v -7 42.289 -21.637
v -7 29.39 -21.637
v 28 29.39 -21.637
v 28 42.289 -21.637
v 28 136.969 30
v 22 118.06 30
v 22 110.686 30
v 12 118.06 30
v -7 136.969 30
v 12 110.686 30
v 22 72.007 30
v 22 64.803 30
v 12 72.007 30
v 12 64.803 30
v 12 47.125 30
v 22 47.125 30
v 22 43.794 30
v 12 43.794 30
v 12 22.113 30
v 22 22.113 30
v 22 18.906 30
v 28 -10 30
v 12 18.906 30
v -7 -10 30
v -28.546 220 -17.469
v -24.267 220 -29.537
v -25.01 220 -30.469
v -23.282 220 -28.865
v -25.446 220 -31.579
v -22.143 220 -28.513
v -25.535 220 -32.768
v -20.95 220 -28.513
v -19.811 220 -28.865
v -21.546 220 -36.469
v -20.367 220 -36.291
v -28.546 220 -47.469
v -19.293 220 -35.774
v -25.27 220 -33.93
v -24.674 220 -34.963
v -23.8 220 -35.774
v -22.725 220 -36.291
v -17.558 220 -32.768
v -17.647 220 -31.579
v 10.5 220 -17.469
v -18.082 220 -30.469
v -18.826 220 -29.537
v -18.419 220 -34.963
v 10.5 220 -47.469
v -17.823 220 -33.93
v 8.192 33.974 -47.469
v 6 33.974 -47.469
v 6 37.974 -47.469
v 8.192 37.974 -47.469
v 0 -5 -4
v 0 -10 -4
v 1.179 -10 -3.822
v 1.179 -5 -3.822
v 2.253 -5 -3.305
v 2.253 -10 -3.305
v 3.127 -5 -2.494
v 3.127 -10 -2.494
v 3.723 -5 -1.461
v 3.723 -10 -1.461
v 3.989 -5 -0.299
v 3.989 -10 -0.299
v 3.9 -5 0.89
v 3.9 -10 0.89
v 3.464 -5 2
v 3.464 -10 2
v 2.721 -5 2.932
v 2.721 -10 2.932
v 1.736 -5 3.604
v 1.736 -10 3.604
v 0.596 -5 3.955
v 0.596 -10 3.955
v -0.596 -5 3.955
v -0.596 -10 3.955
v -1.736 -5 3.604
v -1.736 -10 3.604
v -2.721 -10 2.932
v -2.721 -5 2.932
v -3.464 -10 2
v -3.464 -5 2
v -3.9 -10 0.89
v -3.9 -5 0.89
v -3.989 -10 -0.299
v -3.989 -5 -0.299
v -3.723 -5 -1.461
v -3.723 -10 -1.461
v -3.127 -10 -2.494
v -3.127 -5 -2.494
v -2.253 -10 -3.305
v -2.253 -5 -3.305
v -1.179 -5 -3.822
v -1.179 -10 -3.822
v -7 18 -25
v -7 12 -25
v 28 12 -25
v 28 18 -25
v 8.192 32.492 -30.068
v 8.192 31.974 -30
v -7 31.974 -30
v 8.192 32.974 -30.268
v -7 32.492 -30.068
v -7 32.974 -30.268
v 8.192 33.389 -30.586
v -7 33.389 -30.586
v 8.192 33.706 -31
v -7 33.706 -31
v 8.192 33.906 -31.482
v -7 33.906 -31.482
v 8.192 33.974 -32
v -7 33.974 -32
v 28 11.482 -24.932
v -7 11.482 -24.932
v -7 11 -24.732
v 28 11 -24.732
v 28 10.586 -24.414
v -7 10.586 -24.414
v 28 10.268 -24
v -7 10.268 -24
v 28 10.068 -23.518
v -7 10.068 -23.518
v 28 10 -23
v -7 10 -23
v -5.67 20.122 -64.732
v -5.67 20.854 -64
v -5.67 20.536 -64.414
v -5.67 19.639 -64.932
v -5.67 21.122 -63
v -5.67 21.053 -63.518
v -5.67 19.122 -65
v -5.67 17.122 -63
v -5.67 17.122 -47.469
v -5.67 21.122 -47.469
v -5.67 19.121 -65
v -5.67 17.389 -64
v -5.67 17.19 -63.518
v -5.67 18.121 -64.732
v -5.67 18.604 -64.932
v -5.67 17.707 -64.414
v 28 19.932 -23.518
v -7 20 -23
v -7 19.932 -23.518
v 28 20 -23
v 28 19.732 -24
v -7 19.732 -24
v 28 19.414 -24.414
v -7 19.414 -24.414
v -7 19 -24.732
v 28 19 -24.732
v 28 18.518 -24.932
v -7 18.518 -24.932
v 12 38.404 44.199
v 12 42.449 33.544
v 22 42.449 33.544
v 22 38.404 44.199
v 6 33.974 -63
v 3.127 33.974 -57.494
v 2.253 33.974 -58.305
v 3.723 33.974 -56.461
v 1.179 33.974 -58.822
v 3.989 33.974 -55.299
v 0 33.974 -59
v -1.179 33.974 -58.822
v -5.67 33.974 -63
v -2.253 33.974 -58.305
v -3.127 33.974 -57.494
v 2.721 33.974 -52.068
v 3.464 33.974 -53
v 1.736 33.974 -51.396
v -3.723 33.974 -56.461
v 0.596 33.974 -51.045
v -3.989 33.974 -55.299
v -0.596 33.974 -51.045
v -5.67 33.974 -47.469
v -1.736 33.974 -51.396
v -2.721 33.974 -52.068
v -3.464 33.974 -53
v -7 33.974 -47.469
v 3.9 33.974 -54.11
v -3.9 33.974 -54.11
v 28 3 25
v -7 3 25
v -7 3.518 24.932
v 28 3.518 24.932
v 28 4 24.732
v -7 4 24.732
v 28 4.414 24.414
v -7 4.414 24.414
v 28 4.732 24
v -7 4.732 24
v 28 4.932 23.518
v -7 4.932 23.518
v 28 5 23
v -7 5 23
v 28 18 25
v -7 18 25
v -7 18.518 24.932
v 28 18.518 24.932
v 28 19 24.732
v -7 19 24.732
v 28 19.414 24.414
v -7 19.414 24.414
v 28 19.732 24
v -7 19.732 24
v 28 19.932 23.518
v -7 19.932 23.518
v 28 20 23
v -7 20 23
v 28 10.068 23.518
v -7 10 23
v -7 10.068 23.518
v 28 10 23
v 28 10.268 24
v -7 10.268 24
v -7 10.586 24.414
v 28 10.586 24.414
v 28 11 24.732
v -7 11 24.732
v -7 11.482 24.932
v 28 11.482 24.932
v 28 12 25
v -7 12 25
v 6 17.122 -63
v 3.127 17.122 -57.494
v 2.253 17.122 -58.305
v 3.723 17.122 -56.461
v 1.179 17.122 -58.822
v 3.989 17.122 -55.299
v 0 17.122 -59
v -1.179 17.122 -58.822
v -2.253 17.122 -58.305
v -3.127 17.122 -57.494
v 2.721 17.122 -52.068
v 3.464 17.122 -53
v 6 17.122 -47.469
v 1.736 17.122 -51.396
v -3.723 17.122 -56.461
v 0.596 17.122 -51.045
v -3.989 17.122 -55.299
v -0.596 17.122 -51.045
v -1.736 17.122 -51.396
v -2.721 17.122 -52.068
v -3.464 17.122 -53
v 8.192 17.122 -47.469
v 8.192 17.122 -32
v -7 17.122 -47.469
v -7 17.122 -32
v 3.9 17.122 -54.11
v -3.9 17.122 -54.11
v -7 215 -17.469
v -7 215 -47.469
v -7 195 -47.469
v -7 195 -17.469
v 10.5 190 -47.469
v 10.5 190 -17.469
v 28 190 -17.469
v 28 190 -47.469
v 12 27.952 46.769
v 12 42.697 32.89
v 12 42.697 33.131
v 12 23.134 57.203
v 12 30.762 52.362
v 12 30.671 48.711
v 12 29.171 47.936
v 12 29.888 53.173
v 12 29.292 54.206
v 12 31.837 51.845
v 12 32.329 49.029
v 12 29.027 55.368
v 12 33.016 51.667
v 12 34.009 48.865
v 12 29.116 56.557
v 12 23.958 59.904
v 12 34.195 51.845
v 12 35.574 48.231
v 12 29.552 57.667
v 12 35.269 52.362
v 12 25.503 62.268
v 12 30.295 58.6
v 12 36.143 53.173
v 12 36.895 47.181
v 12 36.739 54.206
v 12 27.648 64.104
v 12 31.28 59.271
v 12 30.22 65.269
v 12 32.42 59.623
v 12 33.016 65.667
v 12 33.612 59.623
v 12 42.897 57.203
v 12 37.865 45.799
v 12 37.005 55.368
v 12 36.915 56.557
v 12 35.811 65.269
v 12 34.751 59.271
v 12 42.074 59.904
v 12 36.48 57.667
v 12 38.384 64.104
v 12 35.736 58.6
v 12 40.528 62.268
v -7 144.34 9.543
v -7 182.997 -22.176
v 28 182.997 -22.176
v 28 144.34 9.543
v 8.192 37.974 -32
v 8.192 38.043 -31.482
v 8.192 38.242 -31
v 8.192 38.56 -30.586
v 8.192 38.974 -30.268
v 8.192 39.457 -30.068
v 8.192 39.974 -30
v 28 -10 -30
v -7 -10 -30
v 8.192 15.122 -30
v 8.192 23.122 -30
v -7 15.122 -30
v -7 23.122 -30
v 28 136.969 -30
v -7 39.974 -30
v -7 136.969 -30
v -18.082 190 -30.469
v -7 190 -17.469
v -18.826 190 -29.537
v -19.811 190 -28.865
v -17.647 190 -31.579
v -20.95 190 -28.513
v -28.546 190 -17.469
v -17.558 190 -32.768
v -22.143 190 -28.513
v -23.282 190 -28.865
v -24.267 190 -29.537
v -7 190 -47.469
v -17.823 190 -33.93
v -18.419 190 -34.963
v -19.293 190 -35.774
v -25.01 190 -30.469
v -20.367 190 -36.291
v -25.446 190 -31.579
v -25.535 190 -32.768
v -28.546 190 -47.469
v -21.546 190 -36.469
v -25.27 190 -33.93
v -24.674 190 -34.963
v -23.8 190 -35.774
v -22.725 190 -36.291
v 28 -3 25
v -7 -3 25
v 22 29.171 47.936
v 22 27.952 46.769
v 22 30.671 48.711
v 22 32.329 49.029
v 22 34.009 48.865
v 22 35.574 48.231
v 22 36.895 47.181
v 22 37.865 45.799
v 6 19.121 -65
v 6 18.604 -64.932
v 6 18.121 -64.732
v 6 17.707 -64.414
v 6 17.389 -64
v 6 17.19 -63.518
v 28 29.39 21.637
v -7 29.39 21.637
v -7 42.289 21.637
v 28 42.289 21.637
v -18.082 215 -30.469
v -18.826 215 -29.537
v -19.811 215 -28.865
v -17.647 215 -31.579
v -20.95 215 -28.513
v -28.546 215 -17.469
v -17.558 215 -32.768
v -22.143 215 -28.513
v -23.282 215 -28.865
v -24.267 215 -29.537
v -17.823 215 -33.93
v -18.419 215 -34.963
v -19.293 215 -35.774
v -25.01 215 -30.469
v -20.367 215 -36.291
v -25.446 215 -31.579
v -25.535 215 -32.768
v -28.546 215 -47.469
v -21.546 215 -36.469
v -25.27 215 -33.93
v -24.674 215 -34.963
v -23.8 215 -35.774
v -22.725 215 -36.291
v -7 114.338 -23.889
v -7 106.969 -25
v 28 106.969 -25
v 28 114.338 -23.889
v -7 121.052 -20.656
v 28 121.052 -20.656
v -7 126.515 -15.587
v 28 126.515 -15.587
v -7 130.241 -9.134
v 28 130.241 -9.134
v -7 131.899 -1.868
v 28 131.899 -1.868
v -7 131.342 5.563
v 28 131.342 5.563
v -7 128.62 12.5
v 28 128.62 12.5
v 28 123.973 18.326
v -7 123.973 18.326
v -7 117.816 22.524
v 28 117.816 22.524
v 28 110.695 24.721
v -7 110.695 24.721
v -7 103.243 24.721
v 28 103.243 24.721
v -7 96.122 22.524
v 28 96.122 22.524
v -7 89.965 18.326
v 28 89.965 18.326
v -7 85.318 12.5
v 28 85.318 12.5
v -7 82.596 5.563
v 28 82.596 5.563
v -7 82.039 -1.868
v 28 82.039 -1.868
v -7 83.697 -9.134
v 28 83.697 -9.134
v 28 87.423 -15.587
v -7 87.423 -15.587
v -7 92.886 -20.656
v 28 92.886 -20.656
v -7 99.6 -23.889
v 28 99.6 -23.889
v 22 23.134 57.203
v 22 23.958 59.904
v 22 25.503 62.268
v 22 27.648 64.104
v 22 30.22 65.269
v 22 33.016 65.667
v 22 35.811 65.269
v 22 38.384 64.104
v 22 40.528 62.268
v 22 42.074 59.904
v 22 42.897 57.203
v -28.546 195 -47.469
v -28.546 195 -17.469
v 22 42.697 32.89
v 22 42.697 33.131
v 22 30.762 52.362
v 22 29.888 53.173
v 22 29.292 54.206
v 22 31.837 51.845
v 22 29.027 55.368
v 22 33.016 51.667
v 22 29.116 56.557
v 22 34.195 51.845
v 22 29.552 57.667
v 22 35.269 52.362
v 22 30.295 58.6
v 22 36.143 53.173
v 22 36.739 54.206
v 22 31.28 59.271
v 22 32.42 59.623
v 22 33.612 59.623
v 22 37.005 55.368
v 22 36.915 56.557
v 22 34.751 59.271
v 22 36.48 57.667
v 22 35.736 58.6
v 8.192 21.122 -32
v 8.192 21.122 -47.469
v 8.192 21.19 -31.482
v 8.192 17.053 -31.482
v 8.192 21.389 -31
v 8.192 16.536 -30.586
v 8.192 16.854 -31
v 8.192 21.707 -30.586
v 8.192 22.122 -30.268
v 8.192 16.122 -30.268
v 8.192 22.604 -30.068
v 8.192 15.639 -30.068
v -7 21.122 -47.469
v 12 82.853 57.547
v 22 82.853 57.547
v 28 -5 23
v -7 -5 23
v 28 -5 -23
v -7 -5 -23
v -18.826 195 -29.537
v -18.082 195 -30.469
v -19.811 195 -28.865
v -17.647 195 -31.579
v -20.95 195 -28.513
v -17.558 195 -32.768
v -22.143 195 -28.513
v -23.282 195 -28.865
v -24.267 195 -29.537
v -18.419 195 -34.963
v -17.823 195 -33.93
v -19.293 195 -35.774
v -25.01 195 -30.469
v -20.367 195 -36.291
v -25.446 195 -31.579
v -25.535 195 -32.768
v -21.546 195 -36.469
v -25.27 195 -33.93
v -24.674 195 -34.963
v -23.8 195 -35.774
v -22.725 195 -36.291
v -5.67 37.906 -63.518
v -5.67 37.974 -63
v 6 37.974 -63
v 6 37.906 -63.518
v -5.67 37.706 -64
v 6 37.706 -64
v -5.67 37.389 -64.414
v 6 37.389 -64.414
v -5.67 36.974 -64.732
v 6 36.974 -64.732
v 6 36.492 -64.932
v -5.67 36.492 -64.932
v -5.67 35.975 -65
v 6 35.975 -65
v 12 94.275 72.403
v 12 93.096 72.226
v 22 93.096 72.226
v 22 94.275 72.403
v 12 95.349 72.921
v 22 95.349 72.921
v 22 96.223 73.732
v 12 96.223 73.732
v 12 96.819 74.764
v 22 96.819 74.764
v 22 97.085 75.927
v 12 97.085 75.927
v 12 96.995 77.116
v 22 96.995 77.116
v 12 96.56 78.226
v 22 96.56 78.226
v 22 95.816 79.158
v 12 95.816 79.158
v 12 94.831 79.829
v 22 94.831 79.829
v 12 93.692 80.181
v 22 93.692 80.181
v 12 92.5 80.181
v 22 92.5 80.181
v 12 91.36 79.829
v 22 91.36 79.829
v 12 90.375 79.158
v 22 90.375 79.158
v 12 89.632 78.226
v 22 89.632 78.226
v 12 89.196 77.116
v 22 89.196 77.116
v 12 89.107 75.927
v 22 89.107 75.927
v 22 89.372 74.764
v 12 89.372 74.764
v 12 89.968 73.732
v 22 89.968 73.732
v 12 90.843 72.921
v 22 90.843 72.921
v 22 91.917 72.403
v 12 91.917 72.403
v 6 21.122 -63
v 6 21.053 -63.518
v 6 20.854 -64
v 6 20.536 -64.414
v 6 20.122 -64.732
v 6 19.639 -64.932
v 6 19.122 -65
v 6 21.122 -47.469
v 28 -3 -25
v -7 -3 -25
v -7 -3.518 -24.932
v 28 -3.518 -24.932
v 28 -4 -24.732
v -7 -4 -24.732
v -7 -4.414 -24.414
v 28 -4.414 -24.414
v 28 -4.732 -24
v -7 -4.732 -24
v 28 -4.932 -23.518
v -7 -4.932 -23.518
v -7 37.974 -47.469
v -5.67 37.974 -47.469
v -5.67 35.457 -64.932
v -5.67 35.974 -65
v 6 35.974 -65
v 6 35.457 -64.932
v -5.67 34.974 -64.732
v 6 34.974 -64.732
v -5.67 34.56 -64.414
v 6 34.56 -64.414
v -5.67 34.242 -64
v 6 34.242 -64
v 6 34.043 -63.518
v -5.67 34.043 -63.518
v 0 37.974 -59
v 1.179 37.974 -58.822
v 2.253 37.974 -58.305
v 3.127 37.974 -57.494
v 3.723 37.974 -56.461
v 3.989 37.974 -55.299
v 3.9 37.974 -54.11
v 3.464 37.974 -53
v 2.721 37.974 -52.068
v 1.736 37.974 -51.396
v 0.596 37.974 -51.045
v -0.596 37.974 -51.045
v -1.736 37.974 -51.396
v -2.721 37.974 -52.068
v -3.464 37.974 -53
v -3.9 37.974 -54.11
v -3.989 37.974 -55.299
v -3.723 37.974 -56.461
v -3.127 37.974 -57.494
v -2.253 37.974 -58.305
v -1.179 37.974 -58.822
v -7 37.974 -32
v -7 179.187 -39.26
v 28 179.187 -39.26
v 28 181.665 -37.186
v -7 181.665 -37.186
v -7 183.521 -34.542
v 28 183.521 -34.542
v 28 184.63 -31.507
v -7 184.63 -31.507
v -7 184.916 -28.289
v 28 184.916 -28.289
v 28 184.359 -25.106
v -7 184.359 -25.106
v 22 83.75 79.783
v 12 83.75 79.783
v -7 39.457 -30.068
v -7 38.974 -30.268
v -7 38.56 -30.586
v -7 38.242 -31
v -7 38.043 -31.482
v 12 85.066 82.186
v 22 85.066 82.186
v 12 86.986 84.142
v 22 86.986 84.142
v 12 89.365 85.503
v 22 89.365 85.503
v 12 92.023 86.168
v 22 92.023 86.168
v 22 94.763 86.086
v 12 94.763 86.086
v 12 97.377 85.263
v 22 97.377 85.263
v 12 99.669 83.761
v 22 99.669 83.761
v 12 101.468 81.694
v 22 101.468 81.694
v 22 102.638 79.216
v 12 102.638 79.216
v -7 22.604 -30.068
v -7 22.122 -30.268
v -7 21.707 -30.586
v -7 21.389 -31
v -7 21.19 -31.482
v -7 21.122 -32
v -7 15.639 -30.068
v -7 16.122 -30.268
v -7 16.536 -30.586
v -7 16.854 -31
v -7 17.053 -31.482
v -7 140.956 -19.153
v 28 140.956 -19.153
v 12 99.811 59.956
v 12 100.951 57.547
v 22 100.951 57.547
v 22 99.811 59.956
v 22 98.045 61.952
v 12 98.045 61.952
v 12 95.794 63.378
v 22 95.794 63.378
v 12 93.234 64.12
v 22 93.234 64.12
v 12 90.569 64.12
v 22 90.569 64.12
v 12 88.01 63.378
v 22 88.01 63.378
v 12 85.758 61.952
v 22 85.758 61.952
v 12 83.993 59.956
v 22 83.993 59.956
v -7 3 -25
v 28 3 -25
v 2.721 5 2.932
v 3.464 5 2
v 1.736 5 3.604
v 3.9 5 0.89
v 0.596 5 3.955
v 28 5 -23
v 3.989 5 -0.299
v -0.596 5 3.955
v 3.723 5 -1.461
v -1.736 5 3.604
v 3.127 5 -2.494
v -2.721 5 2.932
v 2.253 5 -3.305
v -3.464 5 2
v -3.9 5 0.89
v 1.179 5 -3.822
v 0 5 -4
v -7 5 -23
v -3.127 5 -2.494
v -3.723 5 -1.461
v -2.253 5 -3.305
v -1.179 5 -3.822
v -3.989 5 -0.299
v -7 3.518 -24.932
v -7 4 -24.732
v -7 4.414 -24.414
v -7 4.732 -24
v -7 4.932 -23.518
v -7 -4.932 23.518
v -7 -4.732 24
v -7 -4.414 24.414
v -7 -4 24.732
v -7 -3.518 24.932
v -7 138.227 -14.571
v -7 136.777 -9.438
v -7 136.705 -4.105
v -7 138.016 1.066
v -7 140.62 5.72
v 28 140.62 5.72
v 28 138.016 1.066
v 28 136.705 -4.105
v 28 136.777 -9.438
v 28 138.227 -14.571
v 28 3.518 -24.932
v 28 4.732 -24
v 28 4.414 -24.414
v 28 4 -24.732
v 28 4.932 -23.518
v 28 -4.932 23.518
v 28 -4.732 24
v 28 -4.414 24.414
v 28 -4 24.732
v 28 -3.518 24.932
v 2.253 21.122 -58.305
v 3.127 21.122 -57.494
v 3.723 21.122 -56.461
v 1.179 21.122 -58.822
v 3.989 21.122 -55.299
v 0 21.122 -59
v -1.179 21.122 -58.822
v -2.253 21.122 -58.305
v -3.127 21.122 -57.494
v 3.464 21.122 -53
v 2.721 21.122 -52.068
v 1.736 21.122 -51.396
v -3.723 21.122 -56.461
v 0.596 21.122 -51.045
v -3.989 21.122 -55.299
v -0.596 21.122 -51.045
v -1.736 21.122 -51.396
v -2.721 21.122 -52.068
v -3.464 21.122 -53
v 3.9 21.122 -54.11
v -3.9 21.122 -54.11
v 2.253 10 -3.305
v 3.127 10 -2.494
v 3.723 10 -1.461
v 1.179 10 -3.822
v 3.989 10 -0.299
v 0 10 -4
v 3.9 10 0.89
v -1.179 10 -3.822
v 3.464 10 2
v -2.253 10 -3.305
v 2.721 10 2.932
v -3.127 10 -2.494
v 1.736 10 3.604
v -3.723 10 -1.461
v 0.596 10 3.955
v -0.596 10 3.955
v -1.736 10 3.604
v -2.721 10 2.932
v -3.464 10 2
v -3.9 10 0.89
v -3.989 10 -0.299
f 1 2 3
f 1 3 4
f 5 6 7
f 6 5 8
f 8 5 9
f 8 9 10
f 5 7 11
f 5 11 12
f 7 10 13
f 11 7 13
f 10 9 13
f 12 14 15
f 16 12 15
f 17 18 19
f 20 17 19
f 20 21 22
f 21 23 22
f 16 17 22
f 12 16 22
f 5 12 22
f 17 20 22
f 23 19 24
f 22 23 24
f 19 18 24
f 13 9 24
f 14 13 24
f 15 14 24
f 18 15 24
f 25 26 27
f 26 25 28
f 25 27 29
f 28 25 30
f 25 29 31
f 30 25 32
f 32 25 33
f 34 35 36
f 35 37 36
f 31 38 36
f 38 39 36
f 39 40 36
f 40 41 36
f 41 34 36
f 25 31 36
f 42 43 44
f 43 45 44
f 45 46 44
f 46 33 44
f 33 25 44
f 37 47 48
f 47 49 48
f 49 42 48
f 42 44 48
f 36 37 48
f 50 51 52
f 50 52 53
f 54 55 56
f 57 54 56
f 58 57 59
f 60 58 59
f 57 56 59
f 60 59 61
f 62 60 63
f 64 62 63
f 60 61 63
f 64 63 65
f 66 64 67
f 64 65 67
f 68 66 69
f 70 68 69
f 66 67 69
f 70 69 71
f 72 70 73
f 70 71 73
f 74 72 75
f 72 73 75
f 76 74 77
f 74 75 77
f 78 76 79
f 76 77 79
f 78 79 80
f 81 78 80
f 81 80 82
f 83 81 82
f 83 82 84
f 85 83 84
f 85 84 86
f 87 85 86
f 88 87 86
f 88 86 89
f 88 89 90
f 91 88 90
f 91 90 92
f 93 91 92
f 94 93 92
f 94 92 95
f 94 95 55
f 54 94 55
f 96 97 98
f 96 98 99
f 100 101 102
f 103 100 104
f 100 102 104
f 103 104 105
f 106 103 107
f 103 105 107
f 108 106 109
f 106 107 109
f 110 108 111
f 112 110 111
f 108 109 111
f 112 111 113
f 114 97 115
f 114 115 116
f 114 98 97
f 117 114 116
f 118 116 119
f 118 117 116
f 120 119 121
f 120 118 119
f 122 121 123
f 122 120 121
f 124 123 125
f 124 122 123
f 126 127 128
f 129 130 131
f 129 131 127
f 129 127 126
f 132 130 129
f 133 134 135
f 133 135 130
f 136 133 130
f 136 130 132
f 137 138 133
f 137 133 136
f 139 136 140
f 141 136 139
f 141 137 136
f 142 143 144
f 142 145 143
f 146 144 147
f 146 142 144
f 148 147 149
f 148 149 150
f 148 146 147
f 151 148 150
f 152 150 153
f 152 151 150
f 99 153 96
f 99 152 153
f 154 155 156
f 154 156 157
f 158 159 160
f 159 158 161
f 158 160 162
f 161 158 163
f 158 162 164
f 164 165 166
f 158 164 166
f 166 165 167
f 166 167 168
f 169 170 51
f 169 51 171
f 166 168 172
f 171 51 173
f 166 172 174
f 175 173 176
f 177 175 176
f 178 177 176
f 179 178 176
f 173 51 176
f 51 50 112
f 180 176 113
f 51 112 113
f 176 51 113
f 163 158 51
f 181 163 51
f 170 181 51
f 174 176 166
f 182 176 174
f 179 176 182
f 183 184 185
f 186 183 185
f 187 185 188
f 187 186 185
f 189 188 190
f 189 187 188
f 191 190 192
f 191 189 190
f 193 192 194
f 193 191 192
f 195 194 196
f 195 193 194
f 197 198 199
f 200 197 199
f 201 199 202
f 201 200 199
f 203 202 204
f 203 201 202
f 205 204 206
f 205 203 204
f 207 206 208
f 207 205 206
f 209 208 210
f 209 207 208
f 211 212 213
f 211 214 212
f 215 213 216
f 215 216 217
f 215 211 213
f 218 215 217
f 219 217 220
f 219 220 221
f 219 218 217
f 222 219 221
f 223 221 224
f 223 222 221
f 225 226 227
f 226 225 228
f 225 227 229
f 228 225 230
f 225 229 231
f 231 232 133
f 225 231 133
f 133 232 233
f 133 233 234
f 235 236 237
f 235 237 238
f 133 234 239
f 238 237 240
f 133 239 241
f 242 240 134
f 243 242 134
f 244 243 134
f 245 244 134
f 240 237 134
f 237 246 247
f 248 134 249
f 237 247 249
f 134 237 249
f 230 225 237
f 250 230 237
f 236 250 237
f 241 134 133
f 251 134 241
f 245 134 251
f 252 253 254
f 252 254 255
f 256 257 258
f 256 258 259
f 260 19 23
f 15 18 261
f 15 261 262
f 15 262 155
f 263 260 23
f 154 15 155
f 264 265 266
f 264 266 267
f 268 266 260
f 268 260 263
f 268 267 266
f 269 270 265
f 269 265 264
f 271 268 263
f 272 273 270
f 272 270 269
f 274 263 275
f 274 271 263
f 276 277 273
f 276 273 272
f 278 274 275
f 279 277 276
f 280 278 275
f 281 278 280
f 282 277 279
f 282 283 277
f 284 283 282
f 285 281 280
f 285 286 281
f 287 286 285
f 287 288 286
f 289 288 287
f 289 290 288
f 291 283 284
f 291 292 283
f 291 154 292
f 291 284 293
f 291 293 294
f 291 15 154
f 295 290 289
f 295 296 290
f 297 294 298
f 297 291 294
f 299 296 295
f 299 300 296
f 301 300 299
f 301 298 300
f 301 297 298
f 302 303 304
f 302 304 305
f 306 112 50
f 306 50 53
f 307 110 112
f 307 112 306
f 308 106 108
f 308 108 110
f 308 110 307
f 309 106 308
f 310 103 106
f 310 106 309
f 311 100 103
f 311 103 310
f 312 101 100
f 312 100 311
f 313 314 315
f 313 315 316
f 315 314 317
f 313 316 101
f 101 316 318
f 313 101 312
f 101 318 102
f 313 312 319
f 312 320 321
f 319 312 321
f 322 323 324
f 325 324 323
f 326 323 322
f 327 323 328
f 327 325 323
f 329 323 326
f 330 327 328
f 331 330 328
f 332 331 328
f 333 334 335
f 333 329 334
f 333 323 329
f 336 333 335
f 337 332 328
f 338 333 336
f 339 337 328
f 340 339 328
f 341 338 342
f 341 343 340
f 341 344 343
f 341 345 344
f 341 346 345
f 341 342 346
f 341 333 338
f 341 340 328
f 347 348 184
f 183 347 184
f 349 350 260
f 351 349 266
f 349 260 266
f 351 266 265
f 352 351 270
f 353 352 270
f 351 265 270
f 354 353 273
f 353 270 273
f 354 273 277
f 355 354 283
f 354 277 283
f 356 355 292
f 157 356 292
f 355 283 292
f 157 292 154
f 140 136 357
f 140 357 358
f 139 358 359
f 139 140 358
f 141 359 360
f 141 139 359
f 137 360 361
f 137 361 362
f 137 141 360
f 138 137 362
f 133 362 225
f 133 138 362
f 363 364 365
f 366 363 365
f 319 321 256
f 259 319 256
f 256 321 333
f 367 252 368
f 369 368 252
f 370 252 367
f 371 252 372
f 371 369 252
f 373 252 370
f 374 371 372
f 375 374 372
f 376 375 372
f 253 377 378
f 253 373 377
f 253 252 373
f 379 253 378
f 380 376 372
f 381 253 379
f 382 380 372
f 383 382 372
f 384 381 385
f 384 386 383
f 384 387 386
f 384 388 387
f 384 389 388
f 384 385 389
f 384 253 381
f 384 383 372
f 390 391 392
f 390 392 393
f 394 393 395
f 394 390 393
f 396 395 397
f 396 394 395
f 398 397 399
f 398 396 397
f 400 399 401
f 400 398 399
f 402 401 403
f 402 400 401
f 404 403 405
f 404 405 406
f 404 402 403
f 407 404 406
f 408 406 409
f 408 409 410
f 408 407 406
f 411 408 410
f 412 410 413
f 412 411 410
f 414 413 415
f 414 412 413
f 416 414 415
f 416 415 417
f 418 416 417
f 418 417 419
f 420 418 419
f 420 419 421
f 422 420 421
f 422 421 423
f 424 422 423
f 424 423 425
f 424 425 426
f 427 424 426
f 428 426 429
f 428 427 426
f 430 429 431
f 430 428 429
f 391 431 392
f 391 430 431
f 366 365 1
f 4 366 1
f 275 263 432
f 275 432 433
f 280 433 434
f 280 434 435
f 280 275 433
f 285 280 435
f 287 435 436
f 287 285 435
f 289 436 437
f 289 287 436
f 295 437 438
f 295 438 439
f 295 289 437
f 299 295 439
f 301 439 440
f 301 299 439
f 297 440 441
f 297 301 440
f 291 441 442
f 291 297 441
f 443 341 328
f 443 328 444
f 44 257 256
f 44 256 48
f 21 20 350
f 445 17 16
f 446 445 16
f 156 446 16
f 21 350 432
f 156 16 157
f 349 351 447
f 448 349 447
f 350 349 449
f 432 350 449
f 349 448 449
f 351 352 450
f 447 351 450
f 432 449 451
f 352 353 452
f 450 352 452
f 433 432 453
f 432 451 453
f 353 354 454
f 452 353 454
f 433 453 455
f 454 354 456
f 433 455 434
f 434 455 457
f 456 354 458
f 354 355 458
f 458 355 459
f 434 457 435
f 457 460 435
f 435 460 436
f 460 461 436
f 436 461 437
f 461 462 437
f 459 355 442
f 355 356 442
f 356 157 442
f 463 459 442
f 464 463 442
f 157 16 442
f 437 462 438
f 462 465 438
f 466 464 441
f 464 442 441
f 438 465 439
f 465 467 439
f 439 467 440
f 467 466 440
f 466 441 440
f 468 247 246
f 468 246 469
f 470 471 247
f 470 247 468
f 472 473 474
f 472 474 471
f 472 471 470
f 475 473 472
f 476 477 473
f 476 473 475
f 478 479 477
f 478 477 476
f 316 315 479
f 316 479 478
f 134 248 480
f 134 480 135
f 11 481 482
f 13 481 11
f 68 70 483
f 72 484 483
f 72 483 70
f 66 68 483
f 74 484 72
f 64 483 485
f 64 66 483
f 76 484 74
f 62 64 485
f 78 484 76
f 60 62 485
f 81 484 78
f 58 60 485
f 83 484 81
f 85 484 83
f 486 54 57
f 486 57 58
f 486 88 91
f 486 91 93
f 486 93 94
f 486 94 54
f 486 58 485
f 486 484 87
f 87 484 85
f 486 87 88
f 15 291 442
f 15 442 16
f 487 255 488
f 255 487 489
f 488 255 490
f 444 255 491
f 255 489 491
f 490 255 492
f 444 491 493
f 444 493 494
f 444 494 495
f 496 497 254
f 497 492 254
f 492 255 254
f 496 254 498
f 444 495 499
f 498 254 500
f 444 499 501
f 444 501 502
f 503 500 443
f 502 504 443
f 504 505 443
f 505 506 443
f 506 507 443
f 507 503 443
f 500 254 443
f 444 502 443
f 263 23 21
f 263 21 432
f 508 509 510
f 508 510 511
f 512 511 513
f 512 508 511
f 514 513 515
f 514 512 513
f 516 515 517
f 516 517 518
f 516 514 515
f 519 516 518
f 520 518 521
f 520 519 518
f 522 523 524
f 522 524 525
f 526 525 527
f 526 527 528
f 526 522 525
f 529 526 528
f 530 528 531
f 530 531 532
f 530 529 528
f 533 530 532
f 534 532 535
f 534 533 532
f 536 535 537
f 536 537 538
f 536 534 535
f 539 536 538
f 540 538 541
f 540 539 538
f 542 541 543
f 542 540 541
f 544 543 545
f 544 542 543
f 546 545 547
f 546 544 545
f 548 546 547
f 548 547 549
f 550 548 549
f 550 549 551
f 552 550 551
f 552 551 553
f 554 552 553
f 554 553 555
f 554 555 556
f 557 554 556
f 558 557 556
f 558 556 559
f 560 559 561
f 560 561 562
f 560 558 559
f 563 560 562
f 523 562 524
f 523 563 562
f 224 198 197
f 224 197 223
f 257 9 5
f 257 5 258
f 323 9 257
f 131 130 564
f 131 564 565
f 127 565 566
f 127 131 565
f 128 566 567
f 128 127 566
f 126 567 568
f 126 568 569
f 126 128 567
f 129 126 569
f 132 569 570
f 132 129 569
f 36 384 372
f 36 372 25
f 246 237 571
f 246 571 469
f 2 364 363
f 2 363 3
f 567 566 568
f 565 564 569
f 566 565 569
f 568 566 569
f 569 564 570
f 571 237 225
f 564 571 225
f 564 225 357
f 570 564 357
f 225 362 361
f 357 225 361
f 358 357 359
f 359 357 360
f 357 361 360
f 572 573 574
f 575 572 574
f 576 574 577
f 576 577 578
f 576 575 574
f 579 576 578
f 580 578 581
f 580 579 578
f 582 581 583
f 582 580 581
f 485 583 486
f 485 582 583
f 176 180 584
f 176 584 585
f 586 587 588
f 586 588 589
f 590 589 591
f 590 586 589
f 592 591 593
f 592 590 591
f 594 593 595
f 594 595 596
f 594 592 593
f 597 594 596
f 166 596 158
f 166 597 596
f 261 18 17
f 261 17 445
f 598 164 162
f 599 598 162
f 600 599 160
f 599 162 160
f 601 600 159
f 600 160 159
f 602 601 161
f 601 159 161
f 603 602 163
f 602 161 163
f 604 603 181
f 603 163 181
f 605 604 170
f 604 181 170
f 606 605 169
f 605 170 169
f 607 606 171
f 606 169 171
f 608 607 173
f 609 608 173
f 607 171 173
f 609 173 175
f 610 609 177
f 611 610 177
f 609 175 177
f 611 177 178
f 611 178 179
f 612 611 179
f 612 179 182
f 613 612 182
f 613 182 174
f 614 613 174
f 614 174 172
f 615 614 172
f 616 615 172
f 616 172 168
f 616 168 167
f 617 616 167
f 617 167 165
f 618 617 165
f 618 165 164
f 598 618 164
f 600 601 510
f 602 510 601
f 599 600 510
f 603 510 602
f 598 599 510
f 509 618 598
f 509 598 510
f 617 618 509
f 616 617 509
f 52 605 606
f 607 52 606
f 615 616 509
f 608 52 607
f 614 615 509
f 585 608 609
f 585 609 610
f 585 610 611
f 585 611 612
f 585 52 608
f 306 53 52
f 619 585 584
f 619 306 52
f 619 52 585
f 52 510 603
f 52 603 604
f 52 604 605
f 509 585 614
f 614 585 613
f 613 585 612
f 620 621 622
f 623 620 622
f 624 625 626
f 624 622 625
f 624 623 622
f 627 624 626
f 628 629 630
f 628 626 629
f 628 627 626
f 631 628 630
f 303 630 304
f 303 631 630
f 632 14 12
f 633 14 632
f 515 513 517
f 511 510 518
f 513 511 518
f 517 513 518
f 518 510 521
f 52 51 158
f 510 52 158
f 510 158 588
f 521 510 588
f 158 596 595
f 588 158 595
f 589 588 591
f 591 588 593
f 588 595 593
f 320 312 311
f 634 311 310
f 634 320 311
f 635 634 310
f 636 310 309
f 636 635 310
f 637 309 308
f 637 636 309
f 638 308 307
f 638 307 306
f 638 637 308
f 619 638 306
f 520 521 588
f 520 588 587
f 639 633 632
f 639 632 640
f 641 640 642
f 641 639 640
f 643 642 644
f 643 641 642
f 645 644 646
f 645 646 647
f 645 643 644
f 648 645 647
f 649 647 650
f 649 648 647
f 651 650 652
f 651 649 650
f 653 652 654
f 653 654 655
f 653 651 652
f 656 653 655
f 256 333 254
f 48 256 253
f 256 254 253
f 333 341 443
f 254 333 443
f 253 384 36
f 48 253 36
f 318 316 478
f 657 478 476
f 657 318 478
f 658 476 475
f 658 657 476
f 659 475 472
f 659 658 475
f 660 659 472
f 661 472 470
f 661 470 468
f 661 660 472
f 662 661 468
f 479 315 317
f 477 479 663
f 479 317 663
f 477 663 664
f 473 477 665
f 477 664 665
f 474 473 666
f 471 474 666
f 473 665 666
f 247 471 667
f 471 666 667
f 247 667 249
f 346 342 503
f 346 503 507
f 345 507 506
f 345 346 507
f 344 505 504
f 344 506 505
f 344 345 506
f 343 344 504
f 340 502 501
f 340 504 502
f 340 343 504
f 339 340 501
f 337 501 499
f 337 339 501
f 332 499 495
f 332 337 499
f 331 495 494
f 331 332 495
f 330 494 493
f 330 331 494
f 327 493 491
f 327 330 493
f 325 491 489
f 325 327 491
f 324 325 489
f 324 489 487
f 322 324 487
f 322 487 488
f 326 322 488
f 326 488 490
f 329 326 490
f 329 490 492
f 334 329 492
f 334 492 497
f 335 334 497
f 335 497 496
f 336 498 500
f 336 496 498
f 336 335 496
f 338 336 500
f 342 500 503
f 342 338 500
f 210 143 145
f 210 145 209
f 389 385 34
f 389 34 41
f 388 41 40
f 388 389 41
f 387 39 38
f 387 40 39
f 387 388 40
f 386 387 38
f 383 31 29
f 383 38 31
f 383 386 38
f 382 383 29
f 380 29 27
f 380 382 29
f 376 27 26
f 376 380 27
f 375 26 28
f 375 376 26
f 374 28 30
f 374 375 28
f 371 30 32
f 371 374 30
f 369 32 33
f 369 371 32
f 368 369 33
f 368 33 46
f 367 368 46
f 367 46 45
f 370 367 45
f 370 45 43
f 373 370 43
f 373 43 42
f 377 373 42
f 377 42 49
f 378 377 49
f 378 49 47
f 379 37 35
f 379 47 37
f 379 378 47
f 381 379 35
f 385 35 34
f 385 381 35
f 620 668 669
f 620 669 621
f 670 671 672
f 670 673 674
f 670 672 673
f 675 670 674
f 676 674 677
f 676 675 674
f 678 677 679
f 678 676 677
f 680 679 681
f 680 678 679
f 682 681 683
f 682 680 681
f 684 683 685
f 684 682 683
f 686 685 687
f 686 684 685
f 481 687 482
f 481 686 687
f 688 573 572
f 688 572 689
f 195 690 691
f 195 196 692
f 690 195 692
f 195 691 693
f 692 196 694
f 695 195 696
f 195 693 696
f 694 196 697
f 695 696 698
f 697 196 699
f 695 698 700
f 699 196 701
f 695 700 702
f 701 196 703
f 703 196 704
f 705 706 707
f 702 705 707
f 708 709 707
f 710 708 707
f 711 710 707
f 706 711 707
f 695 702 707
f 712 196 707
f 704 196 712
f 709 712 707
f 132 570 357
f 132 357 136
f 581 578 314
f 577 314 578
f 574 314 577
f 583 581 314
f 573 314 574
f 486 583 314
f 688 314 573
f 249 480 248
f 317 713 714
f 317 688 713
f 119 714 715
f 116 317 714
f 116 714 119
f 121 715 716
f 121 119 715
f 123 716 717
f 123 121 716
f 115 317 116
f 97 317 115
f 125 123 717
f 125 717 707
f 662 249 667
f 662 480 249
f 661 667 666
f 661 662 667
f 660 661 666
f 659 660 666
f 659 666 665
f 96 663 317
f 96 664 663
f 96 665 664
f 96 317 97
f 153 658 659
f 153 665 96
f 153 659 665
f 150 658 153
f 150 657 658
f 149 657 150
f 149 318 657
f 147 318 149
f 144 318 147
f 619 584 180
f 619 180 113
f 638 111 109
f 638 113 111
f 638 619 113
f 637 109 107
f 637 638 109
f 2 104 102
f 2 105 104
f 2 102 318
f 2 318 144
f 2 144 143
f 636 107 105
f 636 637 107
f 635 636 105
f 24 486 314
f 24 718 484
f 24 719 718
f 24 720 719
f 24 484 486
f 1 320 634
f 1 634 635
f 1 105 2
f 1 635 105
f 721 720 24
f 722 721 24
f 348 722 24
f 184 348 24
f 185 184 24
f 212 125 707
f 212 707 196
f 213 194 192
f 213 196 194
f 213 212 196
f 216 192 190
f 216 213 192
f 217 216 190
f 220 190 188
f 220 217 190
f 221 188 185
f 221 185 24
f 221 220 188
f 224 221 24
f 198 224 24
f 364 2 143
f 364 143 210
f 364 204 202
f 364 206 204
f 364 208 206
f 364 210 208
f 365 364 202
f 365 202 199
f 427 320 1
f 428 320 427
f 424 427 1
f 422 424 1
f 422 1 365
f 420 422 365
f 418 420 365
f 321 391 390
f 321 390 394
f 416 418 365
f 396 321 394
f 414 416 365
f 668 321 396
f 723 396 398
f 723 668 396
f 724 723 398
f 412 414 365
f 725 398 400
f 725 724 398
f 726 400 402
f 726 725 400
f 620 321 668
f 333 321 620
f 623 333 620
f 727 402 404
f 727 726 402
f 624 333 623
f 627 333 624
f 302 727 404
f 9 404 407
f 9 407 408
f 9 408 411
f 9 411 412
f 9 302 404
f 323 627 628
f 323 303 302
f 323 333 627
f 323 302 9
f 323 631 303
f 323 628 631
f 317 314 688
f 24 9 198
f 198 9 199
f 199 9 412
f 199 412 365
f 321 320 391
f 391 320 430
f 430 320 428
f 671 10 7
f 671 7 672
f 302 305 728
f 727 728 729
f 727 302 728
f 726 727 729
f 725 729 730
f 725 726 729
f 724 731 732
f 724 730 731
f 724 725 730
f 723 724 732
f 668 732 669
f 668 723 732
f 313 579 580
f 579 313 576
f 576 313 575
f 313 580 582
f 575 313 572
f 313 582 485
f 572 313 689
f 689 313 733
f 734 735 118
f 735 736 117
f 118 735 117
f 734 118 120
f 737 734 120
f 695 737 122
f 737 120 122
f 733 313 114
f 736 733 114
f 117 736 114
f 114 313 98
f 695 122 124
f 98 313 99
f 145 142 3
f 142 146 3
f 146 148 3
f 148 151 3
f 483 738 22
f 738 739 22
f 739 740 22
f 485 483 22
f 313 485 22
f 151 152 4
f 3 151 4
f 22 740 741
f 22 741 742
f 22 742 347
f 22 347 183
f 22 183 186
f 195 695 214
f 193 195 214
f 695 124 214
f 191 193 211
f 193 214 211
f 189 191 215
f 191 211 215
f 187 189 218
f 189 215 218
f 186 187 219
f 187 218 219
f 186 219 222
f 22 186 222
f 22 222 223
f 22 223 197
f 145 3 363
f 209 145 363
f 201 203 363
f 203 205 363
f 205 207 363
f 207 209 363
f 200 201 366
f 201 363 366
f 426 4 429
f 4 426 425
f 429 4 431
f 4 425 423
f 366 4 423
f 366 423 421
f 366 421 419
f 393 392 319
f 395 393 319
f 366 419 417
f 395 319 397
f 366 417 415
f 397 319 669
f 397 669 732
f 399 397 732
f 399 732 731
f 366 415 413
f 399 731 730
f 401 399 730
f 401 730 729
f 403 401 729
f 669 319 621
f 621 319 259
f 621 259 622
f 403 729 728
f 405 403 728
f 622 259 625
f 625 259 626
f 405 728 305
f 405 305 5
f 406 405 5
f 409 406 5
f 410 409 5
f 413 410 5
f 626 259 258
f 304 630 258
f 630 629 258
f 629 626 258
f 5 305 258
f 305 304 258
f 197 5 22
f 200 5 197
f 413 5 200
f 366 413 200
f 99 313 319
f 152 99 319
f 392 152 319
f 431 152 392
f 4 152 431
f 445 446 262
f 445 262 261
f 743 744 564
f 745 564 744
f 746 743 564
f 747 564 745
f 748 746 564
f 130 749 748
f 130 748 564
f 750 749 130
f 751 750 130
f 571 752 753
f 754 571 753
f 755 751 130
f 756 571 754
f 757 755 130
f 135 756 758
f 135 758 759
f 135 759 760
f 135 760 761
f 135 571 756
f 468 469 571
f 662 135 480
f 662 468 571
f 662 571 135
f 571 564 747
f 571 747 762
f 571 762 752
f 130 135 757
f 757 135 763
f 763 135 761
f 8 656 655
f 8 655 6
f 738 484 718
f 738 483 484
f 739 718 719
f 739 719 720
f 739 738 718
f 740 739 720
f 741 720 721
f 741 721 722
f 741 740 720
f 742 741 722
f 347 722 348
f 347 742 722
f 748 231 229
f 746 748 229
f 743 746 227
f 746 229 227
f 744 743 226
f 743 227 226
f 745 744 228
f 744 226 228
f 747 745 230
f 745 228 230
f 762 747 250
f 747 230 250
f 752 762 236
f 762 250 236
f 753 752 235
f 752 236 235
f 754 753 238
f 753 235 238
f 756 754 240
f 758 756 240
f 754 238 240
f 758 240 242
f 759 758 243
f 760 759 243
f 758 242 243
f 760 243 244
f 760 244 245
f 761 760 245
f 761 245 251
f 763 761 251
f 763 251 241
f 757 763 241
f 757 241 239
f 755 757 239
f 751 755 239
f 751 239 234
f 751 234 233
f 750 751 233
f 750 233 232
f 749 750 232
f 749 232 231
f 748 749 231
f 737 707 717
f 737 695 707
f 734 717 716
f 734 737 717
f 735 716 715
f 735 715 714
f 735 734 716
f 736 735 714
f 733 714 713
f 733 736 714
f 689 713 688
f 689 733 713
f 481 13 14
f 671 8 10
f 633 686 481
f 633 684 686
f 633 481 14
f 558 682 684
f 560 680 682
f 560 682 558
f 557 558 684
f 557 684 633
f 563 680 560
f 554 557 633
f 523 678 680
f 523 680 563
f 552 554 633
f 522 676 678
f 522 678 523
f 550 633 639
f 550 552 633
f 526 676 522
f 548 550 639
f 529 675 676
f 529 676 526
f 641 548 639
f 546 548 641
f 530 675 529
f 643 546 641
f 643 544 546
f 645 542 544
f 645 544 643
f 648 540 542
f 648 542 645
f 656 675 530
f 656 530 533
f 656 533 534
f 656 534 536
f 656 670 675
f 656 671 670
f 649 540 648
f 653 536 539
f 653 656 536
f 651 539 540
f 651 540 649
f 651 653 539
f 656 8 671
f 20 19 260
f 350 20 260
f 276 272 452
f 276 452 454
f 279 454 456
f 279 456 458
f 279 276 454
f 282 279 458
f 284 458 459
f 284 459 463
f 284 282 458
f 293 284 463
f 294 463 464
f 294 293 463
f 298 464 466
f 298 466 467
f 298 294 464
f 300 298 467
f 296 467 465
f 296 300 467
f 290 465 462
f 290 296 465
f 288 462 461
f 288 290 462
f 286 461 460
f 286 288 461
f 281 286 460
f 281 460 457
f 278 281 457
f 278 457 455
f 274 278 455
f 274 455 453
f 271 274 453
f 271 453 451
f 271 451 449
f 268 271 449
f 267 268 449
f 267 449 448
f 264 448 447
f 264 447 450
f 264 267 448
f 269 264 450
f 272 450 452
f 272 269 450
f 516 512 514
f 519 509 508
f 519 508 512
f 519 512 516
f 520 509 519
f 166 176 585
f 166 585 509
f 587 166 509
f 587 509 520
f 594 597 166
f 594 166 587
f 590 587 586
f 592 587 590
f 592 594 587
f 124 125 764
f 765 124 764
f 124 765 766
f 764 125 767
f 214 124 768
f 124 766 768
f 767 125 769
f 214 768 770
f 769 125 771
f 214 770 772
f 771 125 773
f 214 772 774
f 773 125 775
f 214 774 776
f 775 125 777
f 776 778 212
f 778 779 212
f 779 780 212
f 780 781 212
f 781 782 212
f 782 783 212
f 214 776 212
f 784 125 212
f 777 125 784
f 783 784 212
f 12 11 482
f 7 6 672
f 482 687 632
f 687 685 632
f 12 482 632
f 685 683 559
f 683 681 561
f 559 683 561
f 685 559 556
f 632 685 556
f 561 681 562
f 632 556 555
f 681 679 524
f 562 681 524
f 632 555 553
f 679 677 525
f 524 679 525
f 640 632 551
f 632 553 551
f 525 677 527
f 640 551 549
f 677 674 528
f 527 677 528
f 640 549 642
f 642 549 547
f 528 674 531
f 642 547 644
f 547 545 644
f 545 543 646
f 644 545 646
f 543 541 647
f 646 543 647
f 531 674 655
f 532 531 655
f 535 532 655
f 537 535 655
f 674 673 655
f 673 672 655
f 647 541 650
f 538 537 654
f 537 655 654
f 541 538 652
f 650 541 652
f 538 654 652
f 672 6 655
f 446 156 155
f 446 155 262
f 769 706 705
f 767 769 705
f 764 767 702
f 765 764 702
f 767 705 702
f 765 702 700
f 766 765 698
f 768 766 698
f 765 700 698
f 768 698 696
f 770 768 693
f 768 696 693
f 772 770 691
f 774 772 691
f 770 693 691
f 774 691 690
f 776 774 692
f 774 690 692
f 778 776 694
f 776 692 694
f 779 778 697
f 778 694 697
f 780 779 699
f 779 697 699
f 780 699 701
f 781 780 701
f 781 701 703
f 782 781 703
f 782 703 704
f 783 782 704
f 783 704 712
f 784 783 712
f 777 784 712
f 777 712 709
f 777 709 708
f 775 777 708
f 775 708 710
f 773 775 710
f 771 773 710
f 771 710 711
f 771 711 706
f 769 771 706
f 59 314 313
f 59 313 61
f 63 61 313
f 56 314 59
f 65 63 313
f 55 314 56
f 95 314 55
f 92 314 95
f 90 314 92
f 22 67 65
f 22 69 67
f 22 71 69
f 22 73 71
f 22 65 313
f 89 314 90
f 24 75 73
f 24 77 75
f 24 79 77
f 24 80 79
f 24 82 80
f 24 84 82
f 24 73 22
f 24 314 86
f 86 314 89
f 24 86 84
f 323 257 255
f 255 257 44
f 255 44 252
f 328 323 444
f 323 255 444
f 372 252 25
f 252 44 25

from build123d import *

# Parameters (mm, degrees)
BOSS_EXTRUDE1_DEPTH      = 28
BOSS_EXTRUDE1_DEPTH_BACK = 7
SKETCH1_R                = 25
SKETCH1_W                = 50
SKETCH1_H                = 10
SKETCH3_W                = 21.546368229
SKETCH3_H                = 5
SKETCH3_H_2              = 9.956231156
BOSS_EXTRUDE2_DEPTH      = 35
CUT_EXTRUDE1_DEPTH       = 238.629693409
CUT_EXTRUDE1_DEPTH_BACK  = 40
SKETCH4_R                = 4
SKETCH5_R                = 4
CUT_EXTRUDE2_DEPTH       = 25
SKETCH6_W                = 15.192054263
SKETCH6_H                = 4
BOSS_EXTRUDE4_DEPTH      = 35
SKETCH7_R                = 4
CUT_EXTRUDE3_DEPTH       = 35
BOSS_EXTRUDE5_DEPTH      = 5
BOSS_EXTRUDE5_DEPTH_BACK = 5
SKETCH8_R                = 4
FILLET1_R                = 2
FILLET2_R                = 2
FILLET3_R                = 2
FILLET4_R                = 2
CUT_EXTRUDE6_START       = -7
CUT_EXTRUDE6_DEPTH       = 35
CUT_EXTRUDE8_DEPTH       = 248.462409512
CUT_EXTRUDE9_DEPTH       = 243.60059254
CUT_EXTRUDE9_DEPTH_BACK  = 243.60059254
SKETCH17_W               = 17.5
SKETCH17_H               = 30
CUT_EXTRUDE10_DEPTH      = 243.60059254
SKETCH19_W               = 13.769789611
SKETCH19_H               = 21.894642499
SKETCH19_W_2             = 3.131492763
SKETCH19_H_2             = 18.022692281
CUT_EXTRUDE12_DEPTH      = 243.60059254
CUT_EXTRUDE13_DEPTH      = 243.60059254
CUT_EXTRUDE13_DEPTH_BACK = 243.60059254
SKETCH20_W               = 5
SKETCH20_H               = 30
SKETCH21_W               = 35
SKETCH21_H               = 4.956231156
CUT_EXTRUDE14_DEPTH      = 243.60059254
CUT_EXTRUDE18_DEPTH      = 239.012061805
CUT_EXTRUDE18_DEPTH_BACK = 239.012061805
CUT_EXTRUDE19_DEPTH      = 35
CUT_EXTRUDE19_DEPTH_BACK = 19
CUT_EXTRUDE20_DEPTH      = 239.012061805
CUT_EXTRUDE20_DEPTH_BACK = 239.012061805
SKETCH12_W               = 43.27401944
SKETCH12_H               = 12.898925582
CUT_EXTRUDE24_DEPTH      = 239.012061805
CUT_EXTRUDE24_DEPTH_BACK = 239.012061805
CUT_EXTRUDE26_DEPTH      = 239.012061805
CUT_EXTRUDE26_DEPTH_BACK = 239.012061805
CUT_EXTRUDE27_DEPTH      = 239.012061805
CUT_EXTRUDE27_DEPTH_BACK = 239.012061805
SKETCH29_W               = 2.192054263
SKETCH29_H               = 17.531189733
CUT_EXTRUDE28_DEPTH      = 239.012061805
CUT_EXTRUDE28_DEPTH_BACK = 239.012061805
SKETCH30_W               = 1.330412835
SKETCH30_H               = 17.531189733
CUT_EXTRUDE30_DEPTH      = 239.012061805
CUT_EXTRUDE30_DEPTH_BACK = 239.012061805


# Read off the part's stored shape, not the designer's step: Cut-Extrude6
with BuildPart() as part:
    # Sketch1 → Boss-Extrude1 (new, two sides: drawn at the far end of the back side and taken through both)
    # profile 1 of 3: a face of its own
    with BuildSketch(Plane(origin=(0, 0, 0), x_dir=(0, 0, -1), z_dir=(1, 0, 0)).offset(-BOSS_EXTRUDE1_DEPTH_BACK)):
        Polygon((12.468810267, 220), (12.468810267, 190), (52.468810267, 190), (52.468810267, 205), (52.468810267, 220), align=None)
    # profile 2 of 3: a face of its own
    with BuildSketch(Plane(origin=(0, 0, 0), x_dir=(0, 0, -1), z_dir=(1, 0, 0)).offset(-BOSS_EXTRUDE1_DEPTH_BACK)):
        Polygon((12.468810267, 190), (52.468810267, 190), (30, 136.969027383), (-30, 136.969027383), align=None)
    # profile 3 of 3: a face of its own
    with BuildSketch(Plane(origin=(0, 0, 0), x_dir=(0, 0, -1), z_dir=(1, 0, 0)).offset(-BOSS_EXTRUDE1_DEPTH_BACK)):
        Polygon((-30, 136.969027383), (30, 136.969027383), (30, 106.969027383), (30, 10), (30, -10), (-30, -10), (-30, 10), (-30, 106.969027383), align=None)
        with Locations((0, 106.969027383)):
            Circle(SKETCH1_R, mode=Mode.SUBTRACT)
        Polygon((-25, 20), (-25, 10), (0, 10), (25, 10), (25, 20), align=None, mode=Mode.SUBTRACT)
        Rectangle(SKETCH1_W, SKETCH1_H, mode=Mode.SUBTRACT)
    extrude(amount=BOSS_EXTRUDE1_DEPTH + BOSS_EXTRUDE1_DEPTH_BACK)

    # Sketch3 → Boss-Extrude2 (add)
    with BuildSketch(Plane(origin=(0, 0, -52.468810267), x_dir=(-1, 0, 0), z_dir=(0, 0, -1))):
        with Locations((17.773184115, 192.5)):
            Rectangle(SKETCH3_W, SKETCH3_H)
        with Locations((17.773184115, 219.978115578)):
            Rectangle(SKETCH3_W, SKETCH3_H_2)
    extrude(amount=-BOSS_EXTRUDE2_DEPTH)

    # Sketch4 → Cut-Extrude1 (cut, two sides: drawn at the far end of the back side and taken through both)
    with BuildSketch(Plane(origin=(0, 220, 0), x_dir=(1, 0, 0), z_dir=(0, 1, 0)).offset(-CUT_EXTRUDE1_DEPTH_BACK)):
        with Locations(Location((-21.546368229, 32.468810267, 0), (0, 0, 90))):
            Circle(SKETCH4_R)
    extrude(amount=CUT_EXTRUDE1_DEPTH + CUT_EXTRUDE1_DEPTH_BACK, mode=Mode.SUBTRACT)

    # Sketch5 → Cut-Extrude2 (cut)
    with BuildSketch(Plane.XZ.offset(10)):
        with Locations(Location((0, 0, 0), (0, 0, 270))):
            Circle(SKETCH5_R)
    extrude(amount=-CUT_EXTRUDE2_DEPTH, mode=Mode.SUBTRACT)

    # Sketch6 → Boss-Extrude4 (add)
    with BuildSketch(Plane(origin=(0, 0, -30), x_dir=(-1, 0, 0), z_dir=(0, 0, -1))):
        with Locations((-0.596027132, 35.974427815)):
            Rectangle(SKETCH6_W, SKETCH6_H)
        with Locations((-0.596027132, 19.121539986)):
            Rectangle(SKETCH6_W, SKETCH6_H)
    extrude(amount=BOSS_EXTRUDE4_DEPTH)

    # Sketch7 → Cut-Extrude3 (cut)
    with BuildSketch(Plane.XZ.offset(-17.121539986)):
        with Locations(Location((0, -55, 0), (0, 0, 270))):
            Circle(SKETCH7_R)
    extrude(amount=-CUT_EXTRUDE3_DEPTH, mode=Mode.SUBTRACT)

    # Sketch8 → Boss-Extrude5 (add, two sides: drawn at the far end of the back side and taken through both)
    # profile 1 of 2: a face of its own
    with BuildSketch(Plane(origin=(17, 0, 0), x_dir=(0, 0, -1), z_dir=(1, 0, 0)).offset(-BOSS_EXTRUDE5_DEPTH_BACK)):
        with BuildLine():
            Line((-30, 118.060328993), (-30, 64.802844314))
            Line((-30, 64.802844314), (-79.782583008, 83.7497926))
            ThreePointArc((-79.782583008, 83.7497926), (-86.221055725, 93.395743584), (-79.215750464, 102.638254039))
            Line((-79.215750464, 102.638254039), (-30, 118.060328993))
        make_face()
        with Locations((-76.225555525, 93.095784012)):
            Circle(SKETCH8_R, mode=Mode.SUBTRACT)
    # profile 2 of 2: a face of its own
    with BuildSketch(Plane(origin=(17, 0, 0), x_dir=(0, 0, -1), z_dir=(1, 0, 0)).offset(-BOSS_EXTRUDE5_DEPTH_BACK)):
        with BuildLine():
            Line((-30, 47.125470645), (-30, 18.906005285))
            Line((-30, 18.906005285), (-57.203314441, 23.134394747))
            ThreePointArc((-57.203314441, 23.134394747), (-65.667392499, 33.015737965), (-57.203314441, 42.897081183))
            Line((-57.203314441, 42.897081183), (-30, 47.125470645))
        make_face()
        with Locations((-55.667392499, 33.015737965)):
            Circle(SKETCH8_R, mode=Mode.SUBTRACT)
    extrude(amount=BOSS_EXTRUDE5_DEPTH + BOSS_EXTRUDE5_DEPTH_BACK)

    # Fillet1
    fillet1_edges = [part.edges().sort_by_distance(p)[0] for p in [
        (0.596027131, 37.974427815, -30),
        (0.596027131, 33.974427815, -30),
        (0.596027131, 17.121539986, -30),
        (0.596027131, 21.121539986, -30),
    ]]
    fillet(fillet1_edges, radius=FILLET1_R)

    # Fillet2
    fillet2_edges = [part.edges().sort_by_distance(p)[0] for p in [
        (10.5, -5, 25),
        (10.5, -5, -25),
        (10.5, 10, 25),
        (10.5, 10, -25),
    ]]
    fillet(fillet2_edges, radius=FILLET2_R)

    # Fillet3
    fillet3_edges = [part.edges().sort_by_distance(p)[0] for p in [
        (10.5, 5, 25),
        (10.5, 5, -25),
        (10.5, 20, -25),
        (10.5, 20, 25),
    ]]
    fillet(fillet3_edges, radius=FILLET3_R)

    # Fillet4
    fillet4_edges = [part.edges().sort_by_distance(p)[0] for p in [
        (0.596027131, 17.121539986, -65),
        (0.596027131, 21.121539986, -65),
        (0.596027131, 33.974427815, -65),
        (0.596027131, 37.974427815, -65),
    ]]
    fillet(fillet4_edges, radius=FILLET4_R - 0.0001)  # a hair under: the kernel refuses the full size

    # Cut-Extrude6 outline → Cut-Extrude6 (cut)
    with BuildSketch(Plane(origin=(0, 0, 0), x_dir=(0, 0, -1), z_dir=(1, 0, 0)).offset(CUT_EXTRUDE6_START)):
        Polygon((-30, 136.969027383), (17.468810267, 190), (17.468810267, 220), (12.468810267, 220), (12.468810267, 190), align=None)
    extrude(amount=CUT_EXTRUDE6_DEPTH, mode=Mode.SUBTRACT)

    # Sketch14 → Cut-Extrude8 (cut, through all)
    with BuildSketch(Plane(origin=(28, 0, 0), x_dir=(0, 0, -1), z_dir=(1, 0, 0))):
        with BuildLine():
            Line((34.1686498, 172.523023356), (15.653218162, 146.807146081))
            ThreePointArc((15.653218162, 146.807146081), (6.378159707, 145.297252844), (4.86826647, 154.572311299))
            Line((4.86826647, 154.572311299), (23.383698108, 180.288188574))
            ThreePointArc((23.383698108, 180.288188574), (32.658756563, 181.798081811), (34.1686498, 172.523023356))
        make_face()
    extrude(amount=-CUT_EXTRUDE8_DEPTH, mode=Mode.SUBTRACT)

    # Sketch15 → Cut-Extrude9 (cut, two sides: drawn at the far end of the back side and taken through both)
    with BuildSketch(Plane(origin=(0, 0, 0), x_dir=(0, 0, -1), z_dir=(1, 0, 0)).offset(-CUT_EXTRUDE9_DEPTH_BACK)):
        Polygon((-43.769789611, 101.48799534), (-43.769789611, 79.593352841), (-61.94647395, 90.54067409), align=None)
        Polygon((-33.131492763, 42.696931743), (-33.131492763, 24.674239462), (-48.093727864, 33.685585602), align=None)
    extrude(amount=CUT_EXTRUDE9_DEPTH + CUT_EXTRUDE9_DEPTH_BACK, mode=Mode.SUBTRACT)

    # Sketch17 → Cut-Extrude10 (cut, through all)
    with BuildSketch(Plane.XY):
        with Locations((19.25, 205)):
            Rectangle(SKETCH17_W, SKETCH17_H)
    extrude(amount=-CUT_EXTRUDE10_DEPTH, mode=Mode.SUBTRACT)

    # Sketch19 → Cut-Extrude12 (cut, through all)
    with BuildSketch(Plane(origin=(0, 0, 0), x_dir=(0, 0, -1), z_dir=(1, 0, 0))):
        with Locations((-36.884894806, 90.540674091)):
            Rectangle(SKETCH19_W, SKETCH19_H)
        with Locations((-31.565746382, 33.685585602)):
            Rectangle(SKETCH19_W_2, SKETCH19_H_2)
    extrude(amount=CUT_EXTRUDE12_DEPTH, mode=Mode.SUBTRACT)

    # Sketch20 → Cut-Extrude13 (cut, two sides: drawn at the far end of the back side and taken through both)
    with BuildSketch(Plane(origin=(0, 0, 0), x_dir=(0, 0, -1), z_dir=(1, 0, 0)).offset(-CUT_EXTRUDE13_DEPTH_BACK)):
        with Locations((49.968810267, 205)):
            Rectangle(SKETCH20_W, SKETCH20_H)
    extrude(amount=CUT_EXTRUDE13_DEPTH + CUT_EXTRUDE13_DEPTH_BACK, mode=Mode.SUBTRACT)

    # Sketch21 → Cut-Extrude14 (cut, through all)
    with BuildSketch(Plane(origin=(0, 0, 0), x_dir=(0, 0, -1), z_dir=(1, 0, 0))):
        with Locations((34.968810267, 222.478115578)):
            Rectangle(SKETCH21_W, SKETCH21_H)
    extrude(amount=-CUT_EXTRUDE14_DEPTH, mode=Mode.SUBTRACT)

    # Sketch23 → Cut-Extrude18 (cut, two sides: drawn at the far end of the back side and taken through both)
    with BuildSketch(Plane(origin=(0, 0, 0), x_dir=(0, 0, -1), z_dir=(1, 0, 0)).offset(-CUT_EXTRUDE18_DEPTH_BACK)):
        Polygon((30, 136.969027383), (47.468810267, 190), (52.468810267, 190), align=None)
    extrude(amount=CUT_EXTRUDE18_DEPTH + CUT_EXTRUDE18_DEPTH_BACK, mode=Mode.SUBTRACT)

    # Sketch24 → Cut-Extrude19 (cut, two sides: drawn at the far end of the back side and taken through both)
    with BuildSketch(Plane(origin=(0, 0, 0), x_dir=(0, 0, -1), z_dir=(1, 0, 0)).offset(-CUT_EXTRUDE19_DEPTH_BACK)):
        with BuildLine():
            Line((22.176119959, 182.997319441), (-9.542666893, 144.340047966))
            ThreePointArc((-9.542666893, 144.340047966), (4.104511603, 136.704920477), (19.153374483, 140.956082513))
            Line((19.153374483, 140.956082513), (39.259857136, 179.186718543))
            ThreePointArc((39.259857136, 179.186718543), (31.507189834, 184.630176809), (22.176119959, 182.997319441))
        make_face()
    extrude(amount=CUT_EXTRUDE19_DEPTH + CUT_EXTRUDE19_DEPTH_BACK, mode=Mode.SUBTRACT)

    # Sketch12 → Cut-Extrude20 (cut, two sides: drawn at the far end of the back side and taken through both)
    with BuildSketch(Plane(origin=(0, 0, 0), x_dir=(0, 0, -1), z_dir=(1, 0, 0)).offset(-CUT_EXTRUDE20_DEPTH_BACK)):
        with Locations((0, 35.83943368)):
            Rectangle(SKETCH12_W, SKETCH12_H)
    extrude(amount=CUT_EXTRUDE20_DEPTH + CUT_EXTRUDE20_DEPTH_BACK, mode=Mode.SUBTRACT)

    # Sketch26 → Cut-Extrude24 (cut, two sides: drawn at the far end of the back side and taken through both)
    with BuildSketch(Plane(origin=(0, 0, 0), x_dir=(0, 0, -1), z_dir=(1, 0, 0)).offset(-CUT_EXTRUDE24_DEPTH_BACK)):
        with BuildLine():
            Line((-30, 110.685727942), (-57.547040207, 100.950800214))
            ThreePointArc((-57.547040207, 100.950800214), (-64.213889767, 91.901890883), (-57.547040207, 82.852981552))
            Line((-57.547040207, 82.852981552), (-30, 72.007357372))
            Line((-30, 72.007357372), (-30, 110.685727942))
        make_face()
    extrude(amount=CUT_EXTRUDE24_DEPTH + CUT_EXTRUDE24_DEPTH_BACK, mode=Mode.SUBTRACT)

    # Sketch28 → Cut-Extrude26 (cut, two sides: drawn at the far end of the back side and taken through both)
    with BuildSketch(Plane(origin=(0, 0, 0), x_dir=(0, 0, -1), z_dir=(1, 0, 0)).offset(-CUT_EXTRUDE26_DEPTH_BACK)):
        with BuildLine():
            Line((-30, 43.793670296), (-44.199366323, 38.404428428))
            ThreePointArc((-44.199366323, 38.404428428), (-48.048196325, 34.271707278), (-45.635023396, 29.16587993))
            Line((-45.635023396, 29.16587993), (-30, 23.168887083))
            Line((-30, 23.168887083), (-30, 43.793670296))
        make_face()
    extrude(amount=CUT_EXTRUDE26_DEPTH + CUT_EXTRUDE26_DEPTH_BACK, mode=Mode.SUBTRACT)

    # Sketch29 → Cut-Extrude27 (cut, two sides: drawn at the far end of the back side and taken through both)
    with BuildSketch(Plane(origin=(0, 0, 0), x_dir=(1, 0, 0), z_dir=(0, 1, 0)).offset(-CUT_EXTRUDE27_DEPTH_BACK)):
        with Locations((7.096027132, 56.234405134)):
            Rectangle(SKETCH29_W, SKETCH29_H)
    extrude(amount=CUT_EXTRUDE27_DEPTH + CUT_EXTRUDE27_DEPTH_BACK, mode=Mode.SUBTRACT)

    # Sketch30 → Cut-Extrude28 (cut, two sides: drawn at the far end of the back side and taken through both)
    with BuildSketch(Plane(origin=(0, 0, 0), x_dir=(1, 0, 0), z_dir=(0, 1, 0)).offset(-CUT_EXTRUDE28_DEPTH_BACK)):
        with Locations((-6.334793582, 56.234405134)):
            Rectangle(SKETCH30_W, SKETCH30_H)
    extrude(amount=CUT_EXTRUDE28_DEPTH + CUT_EXTRUDE28_DEPTH_BACK, mode=Mode.SUBTRACT)

    # Sketch31 → Cut-Extrude30 (cut, two sides: drawn at the far end of the back side and taken through both)
    with BuildSketch(Plane(origin=(0, 0, 0), x_dir=(0, 0, -1), z_dir=(1, 0, 0)).offset(-CUT_EXTRUDE30_DEPTH_BACK)):
        with BuildLine():
            Line((-30, 22.113316023), (-46.768850349, 27.951925747))
            ThreePointArc((-46.768850349, 27.951925747), (-48.864559319, 34.00917566), (-44.199366323, 38.404428428))
            Line((-44.199366323, 38.404428428), (-30, 43.793670296))
            Line((-30, 43.793670296), (-30, 22.113316023))
        make_face()
    extrude(amount=CUT_EXTRUDE30_DEPTH + CUT_EXTRUDE30_DEPTH_BACK, mode=Mode.SUBTRACT)


solid = part.part
